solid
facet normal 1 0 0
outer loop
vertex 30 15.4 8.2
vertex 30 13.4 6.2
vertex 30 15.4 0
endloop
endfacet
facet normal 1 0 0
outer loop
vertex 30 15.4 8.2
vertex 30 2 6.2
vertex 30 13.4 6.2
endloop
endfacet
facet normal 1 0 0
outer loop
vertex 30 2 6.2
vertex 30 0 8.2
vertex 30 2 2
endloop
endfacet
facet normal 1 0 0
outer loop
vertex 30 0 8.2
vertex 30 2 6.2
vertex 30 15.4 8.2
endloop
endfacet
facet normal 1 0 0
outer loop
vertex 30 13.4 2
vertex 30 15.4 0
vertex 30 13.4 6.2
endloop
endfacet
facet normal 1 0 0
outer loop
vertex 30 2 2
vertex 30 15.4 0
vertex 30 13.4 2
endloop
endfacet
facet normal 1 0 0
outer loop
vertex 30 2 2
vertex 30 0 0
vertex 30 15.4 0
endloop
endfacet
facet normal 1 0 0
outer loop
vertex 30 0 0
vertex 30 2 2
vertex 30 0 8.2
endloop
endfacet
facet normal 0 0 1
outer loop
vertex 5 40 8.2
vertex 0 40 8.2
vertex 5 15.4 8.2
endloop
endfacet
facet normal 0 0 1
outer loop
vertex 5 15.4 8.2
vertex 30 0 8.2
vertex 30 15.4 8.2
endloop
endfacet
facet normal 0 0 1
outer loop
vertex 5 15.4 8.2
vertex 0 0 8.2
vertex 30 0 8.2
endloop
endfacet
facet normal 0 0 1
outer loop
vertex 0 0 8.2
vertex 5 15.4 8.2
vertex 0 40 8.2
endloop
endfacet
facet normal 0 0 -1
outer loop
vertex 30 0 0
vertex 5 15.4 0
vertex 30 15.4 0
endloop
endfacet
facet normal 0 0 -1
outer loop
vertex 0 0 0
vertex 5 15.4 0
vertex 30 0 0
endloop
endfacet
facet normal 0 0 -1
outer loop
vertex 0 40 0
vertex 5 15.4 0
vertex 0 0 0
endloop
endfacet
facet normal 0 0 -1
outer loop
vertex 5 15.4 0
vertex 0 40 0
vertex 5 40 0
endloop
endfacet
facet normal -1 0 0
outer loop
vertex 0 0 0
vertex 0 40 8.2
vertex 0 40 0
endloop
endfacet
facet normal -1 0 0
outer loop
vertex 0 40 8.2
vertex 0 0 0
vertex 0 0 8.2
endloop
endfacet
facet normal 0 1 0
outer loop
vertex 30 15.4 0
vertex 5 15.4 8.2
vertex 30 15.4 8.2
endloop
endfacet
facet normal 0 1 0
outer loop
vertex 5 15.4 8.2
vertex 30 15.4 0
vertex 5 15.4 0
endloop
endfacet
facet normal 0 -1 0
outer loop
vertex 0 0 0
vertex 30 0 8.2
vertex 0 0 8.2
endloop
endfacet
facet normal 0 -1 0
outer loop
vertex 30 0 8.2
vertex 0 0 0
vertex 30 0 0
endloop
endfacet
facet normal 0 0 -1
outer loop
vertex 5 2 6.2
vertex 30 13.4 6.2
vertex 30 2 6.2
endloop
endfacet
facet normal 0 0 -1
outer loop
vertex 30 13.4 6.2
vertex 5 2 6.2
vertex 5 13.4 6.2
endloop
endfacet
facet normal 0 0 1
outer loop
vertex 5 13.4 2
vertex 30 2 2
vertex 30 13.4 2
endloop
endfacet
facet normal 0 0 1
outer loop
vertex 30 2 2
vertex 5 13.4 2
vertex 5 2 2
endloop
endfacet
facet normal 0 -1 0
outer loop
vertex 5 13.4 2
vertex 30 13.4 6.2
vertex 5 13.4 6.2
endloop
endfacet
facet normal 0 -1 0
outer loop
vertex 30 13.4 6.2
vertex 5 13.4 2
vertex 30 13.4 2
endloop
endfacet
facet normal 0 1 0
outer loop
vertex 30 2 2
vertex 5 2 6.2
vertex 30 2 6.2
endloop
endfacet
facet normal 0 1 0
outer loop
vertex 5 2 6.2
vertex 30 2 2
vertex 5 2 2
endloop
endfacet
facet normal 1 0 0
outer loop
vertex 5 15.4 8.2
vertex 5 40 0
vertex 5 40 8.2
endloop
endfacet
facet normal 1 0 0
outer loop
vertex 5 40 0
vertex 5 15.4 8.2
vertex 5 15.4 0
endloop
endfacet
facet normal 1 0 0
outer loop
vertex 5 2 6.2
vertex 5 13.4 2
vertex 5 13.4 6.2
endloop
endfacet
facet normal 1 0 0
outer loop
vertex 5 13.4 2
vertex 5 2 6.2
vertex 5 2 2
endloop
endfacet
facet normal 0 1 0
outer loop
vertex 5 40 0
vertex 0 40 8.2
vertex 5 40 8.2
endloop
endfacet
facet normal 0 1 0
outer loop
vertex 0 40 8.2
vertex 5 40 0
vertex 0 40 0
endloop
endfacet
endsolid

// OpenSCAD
module cap(){
    difference() {
        cube([30, 11.4 + 4, 4.2 + 4]);
        translate([-0.001, 2, 2]) cube([30 + 0.002, 11.4, 4.2]);
    }
    cube([5, 40, 4.2 + 4]);
}

cap();
